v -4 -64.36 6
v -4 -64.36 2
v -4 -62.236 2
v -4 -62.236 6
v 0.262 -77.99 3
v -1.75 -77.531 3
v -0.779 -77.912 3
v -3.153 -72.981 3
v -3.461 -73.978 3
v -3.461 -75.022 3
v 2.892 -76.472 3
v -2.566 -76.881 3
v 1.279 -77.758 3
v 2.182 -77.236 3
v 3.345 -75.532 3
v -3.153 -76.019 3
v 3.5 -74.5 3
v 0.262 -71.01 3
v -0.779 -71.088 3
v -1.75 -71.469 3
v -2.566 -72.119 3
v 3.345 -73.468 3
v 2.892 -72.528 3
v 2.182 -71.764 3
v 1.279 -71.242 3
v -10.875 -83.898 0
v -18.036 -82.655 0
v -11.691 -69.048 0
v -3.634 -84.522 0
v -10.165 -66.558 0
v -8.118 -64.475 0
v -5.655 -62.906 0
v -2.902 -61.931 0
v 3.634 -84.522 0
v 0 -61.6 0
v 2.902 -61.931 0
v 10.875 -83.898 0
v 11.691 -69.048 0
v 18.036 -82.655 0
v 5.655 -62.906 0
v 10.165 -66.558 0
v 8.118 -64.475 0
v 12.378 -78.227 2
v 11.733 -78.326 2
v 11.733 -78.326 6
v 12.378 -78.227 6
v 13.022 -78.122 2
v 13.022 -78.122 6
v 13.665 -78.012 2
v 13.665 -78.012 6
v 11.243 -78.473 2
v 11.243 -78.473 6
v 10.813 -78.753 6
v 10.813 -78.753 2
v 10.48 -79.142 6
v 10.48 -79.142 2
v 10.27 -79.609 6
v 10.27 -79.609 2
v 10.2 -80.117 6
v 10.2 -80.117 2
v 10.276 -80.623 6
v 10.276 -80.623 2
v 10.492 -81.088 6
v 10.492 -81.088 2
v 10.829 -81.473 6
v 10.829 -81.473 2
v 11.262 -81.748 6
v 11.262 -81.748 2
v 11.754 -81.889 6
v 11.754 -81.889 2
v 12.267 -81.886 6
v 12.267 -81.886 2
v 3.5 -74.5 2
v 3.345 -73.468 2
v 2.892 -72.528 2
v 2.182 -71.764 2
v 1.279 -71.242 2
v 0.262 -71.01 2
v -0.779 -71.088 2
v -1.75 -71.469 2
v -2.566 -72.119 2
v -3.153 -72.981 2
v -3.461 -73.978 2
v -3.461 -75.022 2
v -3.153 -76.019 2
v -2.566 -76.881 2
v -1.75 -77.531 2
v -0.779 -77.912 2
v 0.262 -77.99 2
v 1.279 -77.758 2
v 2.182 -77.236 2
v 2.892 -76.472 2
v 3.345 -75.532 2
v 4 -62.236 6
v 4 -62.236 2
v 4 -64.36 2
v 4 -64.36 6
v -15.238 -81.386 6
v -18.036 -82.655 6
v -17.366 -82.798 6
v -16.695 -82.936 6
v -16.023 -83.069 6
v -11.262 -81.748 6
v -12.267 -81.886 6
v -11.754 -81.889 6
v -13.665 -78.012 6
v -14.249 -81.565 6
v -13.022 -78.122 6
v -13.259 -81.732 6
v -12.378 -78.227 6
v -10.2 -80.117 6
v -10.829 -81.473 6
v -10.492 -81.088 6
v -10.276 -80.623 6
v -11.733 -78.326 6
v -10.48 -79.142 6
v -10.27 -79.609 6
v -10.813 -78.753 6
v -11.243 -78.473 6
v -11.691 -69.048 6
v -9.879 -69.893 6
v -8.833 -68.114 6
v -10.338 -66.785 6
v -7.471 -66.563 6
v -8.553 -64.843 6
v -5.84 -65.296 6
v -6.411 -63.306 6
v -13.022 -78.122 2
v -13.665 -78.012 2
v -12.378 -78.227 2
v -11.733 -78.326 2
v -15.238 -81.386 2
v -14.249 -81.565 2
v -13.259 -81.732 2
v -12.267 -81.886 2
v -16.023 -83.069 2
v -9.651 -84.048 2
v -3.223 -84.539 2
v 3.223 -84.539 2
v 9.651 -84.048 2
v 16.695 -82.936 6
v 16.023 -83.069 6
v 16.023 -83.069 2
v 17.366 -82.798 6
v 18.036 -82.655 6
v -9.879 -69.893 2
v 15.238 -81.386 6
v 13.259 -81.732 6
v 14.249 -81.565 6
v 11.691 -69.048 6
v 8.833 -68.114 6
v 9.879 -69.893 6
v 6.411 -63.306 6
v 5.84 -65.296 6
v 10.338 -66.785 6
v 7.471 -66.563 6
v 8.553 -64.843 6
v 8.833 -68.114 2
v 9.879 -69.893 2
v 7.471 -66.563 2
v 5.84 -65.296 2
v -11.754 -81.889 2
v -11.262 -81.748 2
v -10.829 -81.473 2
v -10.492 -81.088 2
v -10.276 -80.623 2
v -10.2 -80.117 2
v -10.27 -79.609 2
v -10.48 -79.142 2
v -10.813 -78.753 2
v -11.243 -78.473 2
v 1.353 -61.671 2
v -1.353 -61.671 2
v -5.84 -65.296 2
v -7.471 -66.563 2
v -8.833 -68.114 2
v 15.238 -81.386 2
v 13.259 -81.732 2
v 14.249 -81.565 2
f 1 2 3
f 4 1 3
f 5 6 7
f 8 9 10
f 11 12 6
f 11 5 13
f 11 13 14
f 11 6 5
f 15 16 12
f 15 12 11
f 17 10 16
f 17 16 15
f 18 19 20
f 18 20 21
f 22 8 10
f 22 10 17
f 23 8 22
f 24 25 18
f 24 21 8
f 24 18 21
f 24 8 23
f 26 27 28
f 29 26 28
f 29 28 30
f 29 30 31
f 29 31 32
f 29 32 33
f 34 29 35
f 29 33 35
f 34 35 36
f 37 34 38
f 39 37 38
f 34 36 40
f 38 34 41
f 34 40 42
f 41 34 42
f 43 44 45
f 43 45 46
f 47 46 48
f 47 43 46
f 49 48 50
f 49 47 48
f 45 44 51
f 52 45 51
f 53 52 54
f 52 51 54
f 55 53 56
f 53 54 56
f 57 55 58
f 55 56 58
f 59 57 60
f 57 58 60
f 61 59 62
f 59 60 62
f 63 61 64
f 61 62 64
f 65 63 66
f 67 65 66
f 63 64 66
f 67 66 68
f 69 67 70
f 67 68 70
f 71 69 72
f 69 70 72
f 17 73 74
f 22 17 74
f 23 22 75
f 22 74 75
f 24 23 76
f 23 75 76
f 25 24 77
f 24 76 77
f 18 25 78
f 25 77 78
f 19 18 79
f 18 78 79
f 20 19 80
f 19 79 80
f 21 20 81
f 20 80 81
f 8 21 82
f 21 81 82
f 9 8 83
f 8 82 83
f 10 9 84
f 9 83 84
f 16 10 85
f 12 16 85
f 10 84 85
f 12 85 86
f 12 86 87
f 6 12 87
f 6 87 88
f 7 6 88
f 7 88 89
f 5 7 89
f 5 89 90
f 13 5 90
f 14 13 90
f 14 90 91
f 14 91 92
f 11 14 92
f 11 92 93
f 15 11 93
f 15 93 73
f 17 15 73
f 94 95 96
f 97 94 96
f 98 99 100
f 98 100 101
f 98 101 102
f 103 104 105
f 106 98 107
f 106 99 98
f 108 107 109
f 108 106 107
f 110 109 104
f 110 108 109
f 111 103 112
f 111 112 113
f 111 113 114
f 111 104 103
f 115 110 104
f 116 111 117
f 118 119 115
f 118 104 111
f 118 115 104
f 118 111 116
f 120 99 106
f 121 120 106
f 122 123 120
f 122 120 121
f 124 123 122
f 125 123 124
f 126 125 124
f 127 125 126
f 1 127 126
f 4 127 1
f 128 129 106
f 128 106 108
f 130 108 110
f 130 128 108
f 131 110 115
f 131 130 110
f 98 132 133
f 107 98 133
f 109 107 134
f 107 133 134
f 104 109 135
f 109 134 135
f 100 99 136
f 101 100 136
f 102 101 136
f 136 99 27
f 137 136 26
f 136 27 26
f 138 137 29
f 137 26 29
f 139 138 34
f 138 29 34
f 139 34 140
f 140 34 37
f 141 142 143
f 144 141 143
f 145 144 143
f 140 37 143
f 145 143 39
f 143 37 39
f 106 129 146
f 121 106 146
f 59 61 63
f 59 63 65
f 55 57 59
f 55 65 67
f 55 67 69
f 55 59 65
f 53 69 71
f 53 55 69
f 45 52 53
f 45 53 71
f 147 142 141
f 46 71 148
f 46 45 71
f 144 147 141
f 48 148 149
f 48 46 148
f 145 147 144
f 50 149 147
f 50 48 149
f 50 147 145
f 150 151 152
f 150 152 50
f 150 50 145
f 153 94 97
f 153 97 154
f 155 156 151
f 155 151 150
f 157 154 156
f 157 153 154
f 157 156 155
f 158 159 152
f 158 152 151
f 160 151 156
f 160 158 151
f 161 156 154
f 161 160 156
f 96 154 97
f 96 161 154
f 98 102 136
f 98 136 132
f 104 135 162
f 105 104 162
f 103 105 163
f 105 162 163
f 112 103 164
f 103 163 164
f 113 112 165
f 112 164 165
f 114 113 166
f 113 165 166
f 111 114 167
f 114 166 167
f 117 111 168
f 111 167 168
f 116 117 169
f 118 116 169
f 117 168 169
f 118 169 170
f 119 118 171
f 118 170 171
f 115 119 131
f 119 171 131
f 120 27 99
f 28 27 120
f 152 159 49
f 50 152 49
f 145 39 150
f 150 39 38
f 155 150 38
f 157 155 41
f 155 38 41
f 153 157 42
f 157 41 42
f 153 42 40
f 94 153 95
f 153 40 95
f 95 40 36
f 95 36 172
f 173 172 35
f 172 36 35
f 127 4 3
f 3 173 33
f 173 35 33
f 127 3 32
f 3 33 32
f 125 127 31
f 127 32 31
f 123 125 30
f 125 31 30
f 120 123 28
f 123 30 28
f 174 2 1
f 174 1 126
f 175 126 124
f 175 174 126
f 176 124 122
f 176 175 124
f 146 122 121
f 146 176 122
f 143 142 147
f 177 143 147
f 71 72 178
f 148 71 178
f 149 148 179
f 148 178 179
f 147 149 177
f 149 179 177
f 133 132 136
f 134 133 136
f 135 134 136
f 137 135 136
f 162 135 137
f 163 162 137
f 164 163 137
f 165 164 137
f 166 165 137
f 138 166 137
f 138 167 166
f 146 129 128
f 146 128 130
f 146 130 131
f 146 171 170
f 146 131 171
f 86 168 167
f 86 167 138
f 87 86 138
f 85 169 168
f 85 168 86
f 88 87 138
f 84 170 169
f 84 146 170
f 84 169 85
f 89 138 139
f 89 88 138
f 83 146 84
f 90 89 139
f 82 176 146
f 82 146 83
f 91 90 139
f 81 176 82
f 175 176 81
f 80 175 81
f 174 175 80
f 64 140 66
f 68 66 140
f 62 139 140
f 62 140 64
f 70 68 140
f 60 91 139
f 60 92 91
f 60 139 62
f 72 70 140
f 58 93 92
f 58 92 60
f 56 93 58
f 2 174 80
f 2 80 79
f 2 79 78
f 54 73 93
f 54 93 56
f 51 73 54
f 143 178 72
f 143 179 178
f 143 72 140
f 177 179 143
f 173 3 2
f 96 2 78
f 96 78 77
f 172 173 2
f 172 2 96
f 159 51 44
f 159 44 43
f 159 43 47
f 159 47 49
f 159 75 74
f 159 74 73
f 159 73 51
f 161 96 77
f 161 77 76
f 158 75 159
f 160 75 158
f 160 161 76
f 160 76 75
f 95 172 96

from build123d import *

# Parameters (mm, degrees)
PAD001_DEPTH = 4
PAD_DEPTH    = 6
SKETCH002_R  = 3.5
PAD002_DEPTH = 3


with BuildPart() as groove_pad:
    # Sketch001 → Pad001 (new body)
    with BuildSketch(Plane.XY.offset(2)):
        with BuildLine():
            ThreePointArc((-4, -64.360473), (-7.470504, -66.562647), (-9.878753, -69.893457))
            Line((-13.664632, -78.012293), (-9.878753, -69.893457))
            ThreePointArc((-13.664632, -78.012293), (-12.699944, -78.175133), (-11.733319, -78.326044))
            ThreePointArc((-12.266666, -81.886317), (-10.219864, -80.372853), (-11.733319, -78.326044))
            ThreePointArc((-15.237734, -81.385819), (-13.754477, -81.649583), (-12.266666, -81.886317))
            Line((-16.45811, -84.00292), (-15.237734, -81.385819))
            ThreePointArc((-16.45811, -84.00292), (0, -85.6), (16.45811, -84.00292))
            Line((16.45811, -84.00292), (15.237734, -81.385819))
            ThreePointArc((12.266666, -81.886317), (13.754477, -81.649583), (15.237734, -81.385819))
            ThreePointArc((11.733319, -78.326044), (10.219864, -80.372853), (12.266666, -81.886317))
            ThreePointArc((11.733319, -78.326044), (12.699944, -78.175133), (13.664632, -78.012293))
            Line((9.878753, -69.893457), (13.664632, -78.012293))
            ThreePointArc((9.878753, -69.893457), (7.470504, -66.562647), (4, -64.360473))
            Line((4, -61.187975), (4, -64.360473))
            ThreePointArc((4, -61.187975), (0, -60.6), (-4, -61.187975))
            Line((-4, -64.360473), (-4, -61.187975))
        make_face()
    extrude(amount=PAD001_DEPTH)


with BuildPart() as groove_cut:
    # Sketch → Pad (new body)
    with BuildSketch(Plane.XY):
        with BuildLine():
            ThreePointArc((-18.036325, -82.655012), (0, -84.6), (18.036325, -82.655012))
            Line((18.036325, -82.655012), (11.691387, -69.048259))
            ThreePointArc((11.691387, -69.048259), (0, -61.6), (-11.691387, -69.048259))
            Line((-18.036325, -82.655012), (-11.691387, -69.048259))
        make_face()
    extrude(amount=PAD_DEPTH)

    # Cut: cut Groove_Pad
    add(groove_pad.part, mode=Mode.SUBTRACT)


with BuildPart() as fusion:
    # Sketch002 → Pad002 (new body)
    with BuildSketch(Plane.XY):
        with Locations((0, -74.5)):
            Circle(SKETCH002_R)
    extrude(amount=PAD002_DEPTH)

    # Fusion: union Groove_Cut
    add(groove_cut.part)


solid = fusion.part
